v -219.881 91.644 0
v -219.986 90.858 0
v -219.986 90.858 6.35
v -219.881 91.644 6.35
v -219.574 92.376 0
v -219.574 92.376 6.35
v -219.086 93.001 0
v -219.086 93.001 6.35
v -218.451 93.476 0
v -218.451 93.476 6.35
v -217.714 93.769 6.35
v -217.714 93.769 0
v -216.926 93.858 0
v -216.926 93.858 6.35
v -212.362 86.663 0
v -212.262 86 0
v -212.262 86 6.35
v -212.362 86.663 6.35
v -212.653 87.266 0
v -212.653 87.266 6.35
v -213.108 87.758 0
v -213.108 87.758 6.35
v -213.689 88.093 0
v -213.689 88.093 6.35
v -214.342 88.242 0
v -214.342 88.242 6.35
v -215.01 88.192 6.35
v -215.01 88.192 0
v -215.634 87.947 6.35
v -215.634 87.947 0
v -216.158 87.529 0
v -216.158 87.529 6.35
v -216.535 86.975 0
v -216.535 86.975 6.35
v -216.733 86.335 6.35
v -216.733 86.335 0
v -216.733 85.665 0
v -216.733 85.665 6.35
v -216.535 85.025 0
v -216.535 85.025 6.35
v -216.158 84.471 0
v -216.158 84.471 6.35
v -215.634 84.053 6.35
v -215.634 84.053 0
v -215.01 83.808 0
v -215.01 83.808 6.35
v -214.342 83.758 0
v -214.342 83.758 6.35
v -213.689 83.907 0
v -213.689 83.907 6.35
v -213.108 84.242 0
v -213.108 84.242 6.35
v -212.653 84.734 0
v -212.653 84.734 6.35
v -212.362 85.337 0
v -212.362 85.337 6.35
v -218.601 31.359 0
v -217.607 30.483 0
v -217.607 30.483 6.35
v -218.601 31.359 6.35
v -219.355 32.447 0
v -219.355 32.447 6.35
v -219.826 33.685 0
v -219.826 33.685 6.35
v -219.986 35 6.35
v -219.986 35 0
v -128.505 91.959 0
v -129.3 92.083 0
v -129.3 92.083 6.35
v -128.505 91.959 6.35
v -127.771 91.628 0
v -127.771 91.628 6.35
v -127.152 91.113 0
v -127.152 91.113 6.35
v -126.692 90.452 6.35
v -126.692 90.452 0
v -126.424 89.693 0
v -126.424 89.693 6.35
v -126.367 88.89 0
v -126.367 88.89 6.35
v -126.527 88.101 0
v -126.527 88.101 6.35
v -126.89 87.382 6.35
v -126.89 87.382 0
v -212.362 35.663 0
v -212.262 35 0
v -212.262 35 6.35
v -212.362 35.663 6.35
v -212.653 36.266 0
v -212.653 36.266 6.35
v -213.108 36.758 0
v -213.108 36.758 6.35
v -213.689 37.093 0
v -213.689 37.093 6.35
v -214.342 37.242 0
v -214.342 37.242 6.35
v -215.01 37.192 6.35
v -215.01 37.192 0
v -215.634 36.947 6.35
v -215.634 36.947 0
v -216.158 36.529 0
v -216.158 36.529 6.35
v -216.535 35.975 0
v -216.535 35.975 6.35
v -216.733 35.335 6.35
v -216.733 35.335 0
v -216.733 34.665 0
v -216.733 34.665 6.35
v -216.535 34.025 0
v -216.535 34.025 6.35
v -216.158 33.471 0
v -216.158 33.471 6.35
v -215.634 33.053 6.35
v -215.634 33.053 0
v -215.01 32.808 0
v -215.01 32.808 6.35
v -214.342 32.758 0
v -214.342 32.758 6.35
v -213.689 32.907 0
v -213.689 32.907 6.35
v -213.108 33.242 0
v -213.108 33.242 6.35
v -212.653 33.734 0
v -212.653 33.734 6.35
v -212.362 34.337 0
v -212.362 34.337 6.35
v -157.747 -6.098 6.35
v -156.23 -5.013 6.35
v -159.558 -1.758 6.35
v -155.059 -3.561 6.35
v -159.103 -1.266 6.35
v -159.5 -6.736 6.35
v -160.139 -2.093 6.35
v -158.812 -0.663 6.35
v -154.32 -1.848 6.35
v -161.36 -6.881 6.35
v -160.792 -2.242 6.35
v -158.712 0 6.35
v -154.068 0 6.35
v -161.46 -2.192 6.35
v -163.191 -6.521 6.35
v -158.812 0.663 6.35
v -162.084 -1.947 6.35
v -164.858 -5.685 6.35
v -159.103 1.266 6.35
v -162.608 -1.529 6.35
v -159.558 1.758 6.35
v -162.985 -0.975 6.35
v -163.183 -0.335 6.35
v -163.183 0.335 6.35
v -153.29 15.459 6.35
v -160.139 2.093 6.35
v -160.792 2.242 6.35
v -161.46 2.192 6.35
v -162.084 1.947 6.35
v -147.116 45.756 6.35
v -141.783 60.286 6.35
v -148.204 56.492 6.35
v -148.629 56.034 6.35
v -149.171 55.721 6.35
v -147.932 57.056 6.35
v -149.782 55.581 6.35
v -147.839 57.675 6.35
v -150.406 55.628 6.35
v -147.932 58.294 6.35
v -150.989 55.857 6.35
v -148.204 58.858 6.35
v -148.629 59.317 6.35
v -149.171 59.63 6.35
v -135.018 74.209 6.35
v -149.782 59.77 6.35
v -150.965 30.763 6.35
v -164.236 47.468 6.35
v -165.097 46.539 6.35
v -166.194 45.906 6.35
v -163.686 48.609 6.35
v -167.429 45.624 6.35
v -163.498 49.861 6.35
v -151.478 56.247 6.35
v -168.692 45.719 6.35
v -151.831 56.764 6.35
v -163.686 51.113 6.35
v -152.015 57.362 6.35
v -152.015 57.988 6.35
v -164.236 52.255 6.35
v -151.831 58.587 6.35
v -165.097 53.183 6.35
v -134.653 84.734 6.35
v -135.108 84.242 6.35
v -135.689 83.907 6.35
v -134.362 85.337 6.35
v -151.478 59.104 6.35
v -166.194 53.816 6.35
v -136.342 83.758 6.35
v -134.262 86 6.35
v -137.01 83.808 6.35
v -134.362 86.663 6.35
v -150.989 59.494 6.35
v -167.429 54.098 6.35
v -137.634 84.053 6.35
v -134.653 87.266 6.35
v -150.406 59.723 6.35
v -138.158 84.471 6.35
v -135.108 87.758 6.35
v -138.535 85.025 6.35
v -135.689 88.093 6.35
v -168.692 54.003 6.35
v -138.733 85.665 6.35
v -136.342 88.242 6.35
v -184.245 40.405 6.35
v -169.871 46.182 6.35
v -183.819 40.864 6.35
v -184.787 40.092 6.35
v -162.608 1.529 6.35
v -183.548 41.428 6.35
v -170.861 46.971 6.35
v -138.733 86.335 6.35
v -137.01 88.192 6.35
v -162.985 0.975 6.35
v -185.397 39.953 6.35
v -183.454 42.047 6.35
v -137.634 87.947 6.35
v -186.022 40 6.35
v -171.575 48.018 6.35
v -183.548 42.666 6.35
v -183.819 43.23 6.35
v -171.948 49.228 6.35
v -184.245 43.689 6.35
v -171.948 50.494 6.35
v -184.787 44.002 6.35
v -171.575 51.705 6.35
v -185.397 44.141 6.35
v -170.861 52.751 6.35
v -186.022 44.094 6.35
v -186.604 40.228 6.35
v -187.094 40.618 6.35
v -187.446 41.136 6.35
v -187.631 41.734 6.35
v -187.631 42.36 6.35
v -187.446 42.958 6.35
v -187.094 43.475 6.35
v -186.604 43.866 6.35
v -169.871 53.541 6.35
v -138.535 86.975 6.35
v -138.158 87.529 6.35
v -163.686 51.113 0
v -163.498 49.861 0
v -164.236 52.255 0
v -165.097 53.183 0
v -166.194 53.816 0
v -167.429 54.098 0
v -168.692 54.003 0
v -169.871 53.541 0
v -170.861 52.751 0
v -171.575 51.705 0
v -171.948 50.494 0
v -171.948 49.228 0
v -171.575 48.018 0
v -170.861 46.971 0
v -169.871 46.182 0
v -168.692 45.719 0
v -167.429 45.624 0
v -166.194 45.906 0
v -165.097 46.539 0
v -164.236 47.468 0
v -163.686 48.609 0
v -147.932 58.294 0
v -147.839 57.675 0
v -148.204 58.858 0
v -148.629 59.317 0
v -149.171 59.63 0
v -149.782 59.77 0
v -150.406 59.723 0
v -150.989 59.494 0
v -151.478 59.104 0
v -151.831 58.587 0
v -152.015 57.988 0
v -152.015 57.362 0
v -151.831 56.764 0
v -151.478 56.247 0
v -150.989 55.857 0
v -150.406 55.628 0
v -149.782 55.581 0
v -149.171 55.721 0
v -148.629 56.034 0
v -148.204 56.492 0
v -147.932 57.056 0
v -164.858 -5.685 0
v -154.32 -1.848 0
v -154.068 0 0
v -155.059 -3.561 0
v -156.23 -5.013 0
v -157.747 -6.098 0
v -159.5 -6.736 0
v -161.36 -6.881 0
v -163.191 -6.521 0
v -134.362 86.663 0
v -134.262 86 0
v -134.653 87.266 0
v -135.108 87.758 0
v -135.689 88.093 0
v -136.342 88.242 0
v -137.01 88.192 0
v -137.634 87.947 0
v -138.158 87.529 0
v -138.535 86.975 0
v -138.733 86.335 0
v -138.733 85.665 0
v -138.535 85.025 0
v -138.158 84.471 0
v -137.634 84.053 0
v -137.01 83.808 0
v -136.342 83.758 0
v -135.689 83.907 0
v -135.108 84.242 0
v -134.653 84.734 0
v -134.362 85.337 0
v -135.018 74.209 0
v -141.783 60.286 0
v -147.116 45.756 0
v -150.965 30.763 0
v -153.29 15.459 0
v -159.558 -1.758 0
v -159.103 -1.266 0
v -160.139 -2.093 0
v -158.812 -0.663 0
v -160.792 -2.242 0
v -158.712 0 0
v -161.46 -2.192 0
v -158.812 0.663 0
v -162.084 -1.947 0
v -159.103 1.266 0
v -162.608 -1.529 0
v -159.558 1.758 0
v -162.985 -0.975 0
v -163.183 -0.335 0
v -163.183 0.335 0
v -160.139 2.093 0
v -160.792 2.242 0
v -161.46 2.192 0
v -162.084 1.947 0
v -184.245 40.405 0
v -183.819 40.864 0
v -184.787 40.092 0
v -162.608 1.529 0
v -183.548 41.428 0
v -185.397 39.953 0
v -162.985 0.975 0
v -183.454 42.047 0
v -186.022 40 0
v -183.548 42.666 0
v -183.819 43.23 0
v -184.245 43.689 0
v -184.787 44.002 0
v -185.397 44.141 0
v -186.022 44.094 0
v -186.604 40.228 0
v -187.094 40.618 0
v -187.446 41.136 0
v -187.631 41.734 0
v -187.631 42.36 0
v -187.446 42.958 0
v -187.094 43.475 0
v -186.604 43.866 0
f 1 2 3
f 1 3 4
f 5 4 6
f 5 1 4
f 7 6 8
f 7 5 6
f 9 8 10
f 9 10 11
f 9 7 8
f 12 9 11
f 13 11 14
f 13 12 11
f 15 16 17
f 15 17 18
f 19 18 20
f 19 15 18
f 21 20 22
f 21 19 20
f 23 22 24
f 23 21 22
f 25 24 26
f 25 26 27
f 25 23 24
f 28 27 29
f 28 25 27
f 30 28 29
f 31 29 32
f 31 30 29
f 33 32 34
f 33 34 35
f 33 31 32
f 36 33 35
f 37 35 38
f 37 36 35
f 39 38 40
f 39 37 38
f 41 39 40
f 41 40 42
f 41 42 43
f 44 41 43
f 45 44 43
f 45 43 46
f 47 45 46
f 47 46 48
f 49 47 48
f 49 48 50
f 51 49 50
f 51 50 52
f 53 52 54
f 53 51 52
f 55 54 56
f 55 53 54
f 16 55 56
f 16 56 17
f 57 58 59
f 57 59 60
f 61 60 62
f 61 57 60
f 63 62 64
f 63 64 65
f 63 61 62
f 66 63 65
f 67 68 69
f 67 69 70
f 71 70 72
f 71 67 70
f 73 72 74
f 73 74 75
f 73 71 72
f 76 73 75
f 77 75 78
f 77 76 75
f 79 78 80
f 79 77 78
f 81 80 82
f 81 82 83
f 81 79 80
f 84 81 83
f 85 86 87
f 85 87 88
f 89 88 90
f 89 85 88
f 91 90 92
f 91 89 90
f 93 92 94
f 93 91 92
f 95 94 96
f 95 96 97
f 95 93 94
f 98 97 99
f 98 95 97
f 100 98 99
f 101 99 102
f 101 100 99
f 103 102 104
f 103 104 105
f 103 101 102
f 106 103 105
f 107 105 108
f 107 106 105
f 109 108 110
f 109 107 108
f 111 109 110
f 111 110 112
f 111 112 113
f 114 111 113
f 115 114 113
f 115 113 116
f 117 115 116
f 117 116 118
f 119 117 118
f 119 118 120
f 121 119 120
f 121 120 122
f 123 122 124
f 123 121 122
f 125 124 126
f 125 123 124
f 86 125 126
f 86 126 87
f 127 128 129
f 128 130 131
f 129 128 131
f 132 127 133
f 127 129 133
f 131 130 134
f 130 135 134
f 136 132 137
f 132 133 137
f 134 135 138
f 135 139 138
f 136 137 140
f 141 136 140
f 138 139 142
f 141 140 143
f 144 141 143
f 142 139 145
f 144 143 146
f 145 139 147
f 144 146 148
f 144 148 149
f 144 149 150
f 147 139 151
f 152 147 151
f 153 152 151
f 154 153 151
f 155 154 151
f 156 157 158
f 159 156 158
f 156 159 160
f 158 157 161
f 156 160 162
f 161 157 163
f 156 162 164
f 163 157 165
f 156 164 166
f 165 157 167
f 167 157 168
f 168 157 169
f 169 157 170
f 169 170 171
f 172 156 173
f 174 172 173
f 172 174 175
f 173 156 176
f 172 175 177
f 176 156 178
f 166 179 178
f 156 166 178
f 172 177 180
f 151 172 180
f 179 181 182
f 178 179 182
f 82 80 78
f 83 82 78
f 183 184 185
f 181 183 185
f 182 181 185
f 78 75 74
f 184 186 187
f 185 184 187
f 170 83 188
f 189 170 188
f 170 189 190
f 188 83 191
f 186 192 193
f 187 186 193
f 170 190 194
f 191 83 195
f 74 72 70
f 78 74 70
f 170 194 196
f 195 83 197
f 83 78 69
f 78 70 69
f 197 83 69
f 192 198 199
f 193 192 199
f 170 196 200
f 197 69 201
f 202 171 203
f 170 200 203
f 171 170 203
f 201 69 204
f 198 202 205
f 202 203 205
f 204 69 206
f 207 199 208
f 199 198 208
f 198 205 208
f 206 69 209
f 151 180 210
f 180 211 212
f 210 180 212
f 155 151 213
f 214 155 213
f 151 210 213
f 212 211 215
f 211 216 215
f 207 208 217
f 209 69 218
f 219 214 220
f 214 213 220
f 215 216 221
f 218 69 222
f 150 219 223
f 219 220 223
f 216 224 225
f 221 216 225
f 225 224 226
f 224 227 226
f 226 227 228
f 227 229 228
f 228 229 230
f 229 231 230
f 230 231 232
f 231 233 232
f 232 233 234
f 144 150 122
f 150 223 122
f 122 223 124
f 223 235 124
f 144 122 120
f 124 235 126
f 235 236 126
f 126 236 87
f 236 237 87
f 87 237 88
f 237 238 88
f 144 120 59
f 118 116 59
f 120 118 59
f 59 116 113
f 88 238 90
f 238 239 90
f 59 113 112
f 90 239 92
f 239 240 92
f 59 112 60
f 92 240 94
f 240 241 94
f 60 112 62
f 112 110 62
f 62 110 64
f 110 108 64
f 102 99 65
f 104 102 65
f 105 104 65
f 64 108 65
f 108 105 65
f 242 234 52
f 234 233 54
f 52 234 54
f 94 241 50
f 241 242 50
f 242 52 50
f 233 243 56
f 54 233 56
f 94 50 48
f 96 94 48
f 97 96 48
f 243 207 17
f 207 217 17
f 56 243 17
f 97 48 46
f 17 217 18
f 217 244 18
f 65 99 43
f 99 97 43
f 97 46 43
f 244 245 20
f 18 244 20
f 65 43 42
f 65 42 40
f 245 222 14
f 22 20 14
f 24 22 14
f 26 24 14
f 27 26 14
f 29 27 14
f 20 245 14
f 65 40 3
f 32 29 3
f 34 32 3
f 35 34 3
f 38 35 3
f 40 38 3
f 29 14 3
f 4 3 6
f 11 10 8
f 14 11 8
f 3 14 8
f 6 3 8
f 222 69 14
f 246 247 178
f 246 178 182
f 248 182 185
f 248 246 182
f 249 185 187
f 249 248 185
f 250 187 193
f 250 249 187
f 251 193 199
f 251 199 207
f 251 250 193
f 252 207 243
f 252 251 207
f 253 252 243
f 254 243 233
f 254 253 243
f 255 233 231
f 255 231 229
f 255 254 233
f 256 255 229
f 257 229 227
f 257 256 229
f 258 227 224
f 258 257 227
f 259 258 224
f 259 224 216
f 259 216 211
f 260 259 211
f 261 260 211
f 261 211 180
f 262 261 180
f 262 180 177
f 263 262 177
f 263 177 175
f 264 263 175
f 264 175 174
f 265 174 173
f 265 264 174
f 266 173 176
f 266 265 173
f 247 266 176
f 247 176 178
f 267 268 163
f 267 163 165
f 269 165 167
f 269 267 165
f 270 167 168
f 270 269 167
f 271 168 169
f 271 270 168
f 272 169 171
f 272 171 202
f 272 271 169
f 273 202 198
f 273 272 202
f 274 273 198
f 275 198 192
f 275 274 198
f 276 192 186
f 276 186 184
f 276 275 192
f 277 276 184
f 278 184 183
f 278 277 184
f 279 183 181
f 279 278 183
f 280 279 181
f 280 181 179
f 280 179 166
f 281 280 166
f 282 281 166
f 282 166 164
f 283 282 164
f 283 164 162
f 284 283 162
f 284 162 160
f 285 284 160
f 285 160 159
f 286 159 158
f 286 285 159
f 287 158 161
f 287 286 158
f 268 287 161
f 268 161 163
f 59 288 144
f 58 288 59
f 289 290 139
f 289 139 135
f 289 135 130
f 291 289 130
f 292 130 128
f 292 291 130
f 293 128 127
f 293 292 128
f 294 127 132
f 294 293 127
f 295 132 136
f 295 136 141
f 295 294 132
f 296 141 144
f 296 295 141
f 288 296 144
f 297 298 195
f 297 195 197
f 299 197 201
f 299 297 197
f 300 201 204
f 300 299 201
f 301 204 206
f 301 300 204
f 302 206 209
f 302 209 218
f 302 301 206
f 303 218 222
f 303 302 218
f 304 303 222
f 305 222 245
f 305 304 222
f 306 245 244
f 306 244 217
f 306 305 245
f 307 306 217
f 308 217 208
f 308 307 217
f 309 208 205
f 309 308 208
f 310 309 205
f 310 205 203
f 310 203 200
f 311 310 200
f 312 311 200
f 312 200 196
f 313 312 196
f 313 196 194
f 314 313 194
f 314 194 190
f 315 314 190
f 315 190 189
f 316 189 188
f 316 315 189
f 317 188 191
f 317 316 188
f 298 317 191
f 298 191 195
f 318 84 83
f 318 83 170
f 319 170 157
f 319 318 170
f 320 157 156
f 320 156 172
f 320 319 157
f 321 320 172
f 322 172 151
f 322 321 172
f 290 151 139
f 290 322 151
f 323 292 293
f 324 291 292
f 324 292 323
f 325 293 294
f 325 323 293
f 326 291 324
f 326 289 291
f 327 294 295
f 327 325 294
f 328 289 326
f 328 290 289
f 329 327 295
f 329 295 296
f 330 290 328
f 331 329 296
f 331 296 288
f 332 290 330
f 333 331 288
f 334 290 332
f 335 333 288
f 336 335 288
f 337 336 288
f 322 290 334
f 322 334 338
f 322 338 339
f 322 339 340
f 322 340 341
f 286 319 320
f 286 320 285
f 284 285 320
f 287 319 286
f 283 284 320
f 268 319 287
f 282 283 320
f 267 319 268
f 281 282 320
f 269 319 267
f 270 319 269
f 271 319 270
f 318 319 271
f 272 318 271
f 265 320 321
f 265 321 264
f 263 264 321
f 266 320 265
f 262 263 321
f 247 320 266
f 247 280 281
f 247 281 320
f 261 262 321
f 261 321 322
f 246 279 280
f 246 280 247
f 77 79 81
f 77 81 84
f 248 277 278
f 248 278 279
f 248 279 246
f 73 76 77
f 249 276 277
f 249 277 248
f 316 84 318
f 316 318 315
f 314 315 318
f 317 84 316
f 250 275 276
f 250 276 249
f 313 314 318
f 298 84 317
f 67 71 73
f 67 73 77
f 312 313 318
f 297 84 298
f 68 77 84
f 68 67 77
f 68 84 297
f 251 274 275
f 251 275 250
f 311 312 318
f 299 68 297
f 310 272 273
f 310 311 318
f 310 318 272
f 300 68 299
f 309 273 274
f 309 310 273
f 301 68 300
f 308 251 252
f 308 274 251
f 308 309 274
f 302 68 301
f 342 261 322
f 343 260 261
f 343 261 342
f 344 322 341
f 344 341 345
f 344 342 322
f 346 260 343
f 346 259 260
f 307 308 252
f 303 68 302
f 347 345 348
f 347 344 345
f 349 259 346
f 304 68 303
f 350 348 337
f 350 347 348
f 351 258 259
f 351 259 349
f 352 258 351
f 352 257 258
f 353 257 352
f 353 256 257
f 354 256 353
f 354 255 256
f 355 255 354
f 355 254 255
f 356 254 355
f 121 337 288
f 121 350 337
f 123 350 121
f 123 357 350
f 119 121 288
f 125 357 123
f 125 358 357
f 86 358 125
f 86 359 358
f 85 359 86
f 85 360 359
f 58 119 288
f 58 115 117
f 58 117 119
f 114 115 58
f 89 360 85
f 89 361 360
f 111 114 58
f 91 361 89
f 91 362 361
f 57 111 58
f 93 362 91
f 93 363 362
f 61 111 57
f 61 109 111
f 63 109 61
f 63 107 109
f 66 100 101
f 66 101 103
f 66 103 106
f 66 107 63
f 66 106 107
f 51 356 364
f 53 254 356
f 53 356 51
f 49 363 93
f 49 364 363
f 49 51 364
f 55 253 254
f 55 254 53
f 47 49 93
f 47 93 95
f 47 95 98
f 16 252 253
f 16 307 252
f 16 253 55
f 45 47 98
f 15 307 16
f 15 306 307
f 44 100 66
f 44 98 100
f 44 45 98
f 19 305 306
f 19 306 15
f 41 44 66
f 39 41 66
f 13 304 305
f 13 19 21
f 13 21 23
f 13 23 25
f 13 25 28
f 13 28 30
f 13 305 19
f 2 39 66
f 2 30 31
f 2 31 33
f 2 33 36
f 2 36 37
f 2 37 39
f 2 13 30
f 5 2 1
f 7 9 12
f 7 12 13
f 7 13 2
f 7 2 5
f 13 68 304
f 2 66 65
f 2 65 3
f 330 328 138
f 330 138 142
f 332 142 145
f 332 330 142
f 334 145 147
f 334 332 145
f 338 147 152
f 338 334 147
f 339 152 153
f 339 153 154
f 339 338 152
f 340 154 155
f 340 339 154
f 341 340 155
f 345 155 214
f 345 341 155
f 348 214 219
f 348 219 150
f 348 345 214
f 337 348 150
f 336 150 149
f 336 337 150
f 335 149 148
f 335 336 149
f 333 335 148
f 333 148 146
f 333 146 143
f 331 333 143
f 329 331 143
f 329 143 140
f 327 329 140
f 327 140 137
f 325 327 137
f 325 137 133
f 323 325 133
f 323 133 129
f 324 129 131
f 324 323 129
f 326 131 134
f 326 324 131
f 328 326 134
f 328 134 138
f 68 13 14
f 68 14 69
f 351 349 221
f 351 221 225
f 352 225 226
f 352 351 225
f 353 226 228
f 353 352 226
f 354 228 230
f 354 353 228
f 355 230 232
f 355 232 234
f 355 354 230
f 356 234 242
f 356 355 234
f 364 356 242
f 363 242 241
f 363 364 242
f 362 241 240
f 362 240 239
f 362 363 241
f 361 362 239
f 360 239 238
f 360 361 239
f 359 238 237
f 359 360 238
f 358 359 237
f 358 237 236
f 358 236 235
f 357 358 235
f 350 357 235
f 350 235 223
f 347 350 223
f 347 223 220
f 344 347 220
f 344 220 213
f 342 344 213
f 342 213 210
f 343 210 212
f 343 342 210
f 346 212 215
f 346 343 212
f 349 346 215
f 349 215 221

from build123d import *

# Parameters (mm, degrees)
SKETCH1_R           = 2.1
SKETCH1_R_2         = 4.248828393
SKETCH1_R_3         = 2.248
BOSS_EXTRUDE1_DEPTH = 6.35


with BuildPart() as part:
    # Sketch1 → Boss-Extrude1 (new body)
    with BuildSketch(Plane.XY):
        with BuildLine():
            Line((-164.857630571, -5.684506245), (-217.606823936, 30.483431618))
            ThreePointArc((-217.606823936, 30.483431618), (-219.355038804, 32.447489975), (-219.986286008, 35))
            Line((-219.986286008, 35), (-219.986286008, 90.85821565))
            ThreePointArc((-219.986286008, 90.85821565), (-219.086022557, 93.00090238), (-216.925548391, 93.857600744))
            Line((-216.925548391, 93.857600744), (-129.300414508, 92.083189784))
            ThreePointArc((-129.300414508, 92.083189784), (-126.69155089, 90.452464344), (-126.890346887, 87.38229904))
            ThreePointArc((-126.890346887, 87.38229904), (-147.116480921, 45.755517262), (-154.067603079, 0))
            ThreePointArc((-154.067603079, 0), (-157.747437287, -6.09791572), (-164.857630571, -5.684506245))
        make_face()
        with Locations((-185.554258914, 42.046855659)):
            Circle(SKETCH1_R, mode=Mode.SUBTRACT)
        with Locations((-149.938627555, 57.675374206)):
            Circle(SKETCH1_R, mode=Mode.SUBTRACT)
        with Locations((-167.746443234, 49.861114932)):
            Circle(SKETCH1_R_2, mode=Mode.SUBTRACT)
        with Locations((-214.51, 86)):
            Circle(SKETCH1_R_3, mode=Mode.SUBTRACT)
        with Locations((-214.51, 35)):
            Circle(SKETCH1_R_3, mode=Mode.SUBTRACT)
        with Locations((-136.51, 86)):
            Circle(SKETCH1_R_3, mode=Mode.SUBTRACT)
        with Locations((-160.96, 0)):
            Circle(SKETCH1_R_3, mode=Mode.SUBTRACT)
    extrude(amount=BOSS_EXTRUDE1_DEPTH)


solid = part.part
